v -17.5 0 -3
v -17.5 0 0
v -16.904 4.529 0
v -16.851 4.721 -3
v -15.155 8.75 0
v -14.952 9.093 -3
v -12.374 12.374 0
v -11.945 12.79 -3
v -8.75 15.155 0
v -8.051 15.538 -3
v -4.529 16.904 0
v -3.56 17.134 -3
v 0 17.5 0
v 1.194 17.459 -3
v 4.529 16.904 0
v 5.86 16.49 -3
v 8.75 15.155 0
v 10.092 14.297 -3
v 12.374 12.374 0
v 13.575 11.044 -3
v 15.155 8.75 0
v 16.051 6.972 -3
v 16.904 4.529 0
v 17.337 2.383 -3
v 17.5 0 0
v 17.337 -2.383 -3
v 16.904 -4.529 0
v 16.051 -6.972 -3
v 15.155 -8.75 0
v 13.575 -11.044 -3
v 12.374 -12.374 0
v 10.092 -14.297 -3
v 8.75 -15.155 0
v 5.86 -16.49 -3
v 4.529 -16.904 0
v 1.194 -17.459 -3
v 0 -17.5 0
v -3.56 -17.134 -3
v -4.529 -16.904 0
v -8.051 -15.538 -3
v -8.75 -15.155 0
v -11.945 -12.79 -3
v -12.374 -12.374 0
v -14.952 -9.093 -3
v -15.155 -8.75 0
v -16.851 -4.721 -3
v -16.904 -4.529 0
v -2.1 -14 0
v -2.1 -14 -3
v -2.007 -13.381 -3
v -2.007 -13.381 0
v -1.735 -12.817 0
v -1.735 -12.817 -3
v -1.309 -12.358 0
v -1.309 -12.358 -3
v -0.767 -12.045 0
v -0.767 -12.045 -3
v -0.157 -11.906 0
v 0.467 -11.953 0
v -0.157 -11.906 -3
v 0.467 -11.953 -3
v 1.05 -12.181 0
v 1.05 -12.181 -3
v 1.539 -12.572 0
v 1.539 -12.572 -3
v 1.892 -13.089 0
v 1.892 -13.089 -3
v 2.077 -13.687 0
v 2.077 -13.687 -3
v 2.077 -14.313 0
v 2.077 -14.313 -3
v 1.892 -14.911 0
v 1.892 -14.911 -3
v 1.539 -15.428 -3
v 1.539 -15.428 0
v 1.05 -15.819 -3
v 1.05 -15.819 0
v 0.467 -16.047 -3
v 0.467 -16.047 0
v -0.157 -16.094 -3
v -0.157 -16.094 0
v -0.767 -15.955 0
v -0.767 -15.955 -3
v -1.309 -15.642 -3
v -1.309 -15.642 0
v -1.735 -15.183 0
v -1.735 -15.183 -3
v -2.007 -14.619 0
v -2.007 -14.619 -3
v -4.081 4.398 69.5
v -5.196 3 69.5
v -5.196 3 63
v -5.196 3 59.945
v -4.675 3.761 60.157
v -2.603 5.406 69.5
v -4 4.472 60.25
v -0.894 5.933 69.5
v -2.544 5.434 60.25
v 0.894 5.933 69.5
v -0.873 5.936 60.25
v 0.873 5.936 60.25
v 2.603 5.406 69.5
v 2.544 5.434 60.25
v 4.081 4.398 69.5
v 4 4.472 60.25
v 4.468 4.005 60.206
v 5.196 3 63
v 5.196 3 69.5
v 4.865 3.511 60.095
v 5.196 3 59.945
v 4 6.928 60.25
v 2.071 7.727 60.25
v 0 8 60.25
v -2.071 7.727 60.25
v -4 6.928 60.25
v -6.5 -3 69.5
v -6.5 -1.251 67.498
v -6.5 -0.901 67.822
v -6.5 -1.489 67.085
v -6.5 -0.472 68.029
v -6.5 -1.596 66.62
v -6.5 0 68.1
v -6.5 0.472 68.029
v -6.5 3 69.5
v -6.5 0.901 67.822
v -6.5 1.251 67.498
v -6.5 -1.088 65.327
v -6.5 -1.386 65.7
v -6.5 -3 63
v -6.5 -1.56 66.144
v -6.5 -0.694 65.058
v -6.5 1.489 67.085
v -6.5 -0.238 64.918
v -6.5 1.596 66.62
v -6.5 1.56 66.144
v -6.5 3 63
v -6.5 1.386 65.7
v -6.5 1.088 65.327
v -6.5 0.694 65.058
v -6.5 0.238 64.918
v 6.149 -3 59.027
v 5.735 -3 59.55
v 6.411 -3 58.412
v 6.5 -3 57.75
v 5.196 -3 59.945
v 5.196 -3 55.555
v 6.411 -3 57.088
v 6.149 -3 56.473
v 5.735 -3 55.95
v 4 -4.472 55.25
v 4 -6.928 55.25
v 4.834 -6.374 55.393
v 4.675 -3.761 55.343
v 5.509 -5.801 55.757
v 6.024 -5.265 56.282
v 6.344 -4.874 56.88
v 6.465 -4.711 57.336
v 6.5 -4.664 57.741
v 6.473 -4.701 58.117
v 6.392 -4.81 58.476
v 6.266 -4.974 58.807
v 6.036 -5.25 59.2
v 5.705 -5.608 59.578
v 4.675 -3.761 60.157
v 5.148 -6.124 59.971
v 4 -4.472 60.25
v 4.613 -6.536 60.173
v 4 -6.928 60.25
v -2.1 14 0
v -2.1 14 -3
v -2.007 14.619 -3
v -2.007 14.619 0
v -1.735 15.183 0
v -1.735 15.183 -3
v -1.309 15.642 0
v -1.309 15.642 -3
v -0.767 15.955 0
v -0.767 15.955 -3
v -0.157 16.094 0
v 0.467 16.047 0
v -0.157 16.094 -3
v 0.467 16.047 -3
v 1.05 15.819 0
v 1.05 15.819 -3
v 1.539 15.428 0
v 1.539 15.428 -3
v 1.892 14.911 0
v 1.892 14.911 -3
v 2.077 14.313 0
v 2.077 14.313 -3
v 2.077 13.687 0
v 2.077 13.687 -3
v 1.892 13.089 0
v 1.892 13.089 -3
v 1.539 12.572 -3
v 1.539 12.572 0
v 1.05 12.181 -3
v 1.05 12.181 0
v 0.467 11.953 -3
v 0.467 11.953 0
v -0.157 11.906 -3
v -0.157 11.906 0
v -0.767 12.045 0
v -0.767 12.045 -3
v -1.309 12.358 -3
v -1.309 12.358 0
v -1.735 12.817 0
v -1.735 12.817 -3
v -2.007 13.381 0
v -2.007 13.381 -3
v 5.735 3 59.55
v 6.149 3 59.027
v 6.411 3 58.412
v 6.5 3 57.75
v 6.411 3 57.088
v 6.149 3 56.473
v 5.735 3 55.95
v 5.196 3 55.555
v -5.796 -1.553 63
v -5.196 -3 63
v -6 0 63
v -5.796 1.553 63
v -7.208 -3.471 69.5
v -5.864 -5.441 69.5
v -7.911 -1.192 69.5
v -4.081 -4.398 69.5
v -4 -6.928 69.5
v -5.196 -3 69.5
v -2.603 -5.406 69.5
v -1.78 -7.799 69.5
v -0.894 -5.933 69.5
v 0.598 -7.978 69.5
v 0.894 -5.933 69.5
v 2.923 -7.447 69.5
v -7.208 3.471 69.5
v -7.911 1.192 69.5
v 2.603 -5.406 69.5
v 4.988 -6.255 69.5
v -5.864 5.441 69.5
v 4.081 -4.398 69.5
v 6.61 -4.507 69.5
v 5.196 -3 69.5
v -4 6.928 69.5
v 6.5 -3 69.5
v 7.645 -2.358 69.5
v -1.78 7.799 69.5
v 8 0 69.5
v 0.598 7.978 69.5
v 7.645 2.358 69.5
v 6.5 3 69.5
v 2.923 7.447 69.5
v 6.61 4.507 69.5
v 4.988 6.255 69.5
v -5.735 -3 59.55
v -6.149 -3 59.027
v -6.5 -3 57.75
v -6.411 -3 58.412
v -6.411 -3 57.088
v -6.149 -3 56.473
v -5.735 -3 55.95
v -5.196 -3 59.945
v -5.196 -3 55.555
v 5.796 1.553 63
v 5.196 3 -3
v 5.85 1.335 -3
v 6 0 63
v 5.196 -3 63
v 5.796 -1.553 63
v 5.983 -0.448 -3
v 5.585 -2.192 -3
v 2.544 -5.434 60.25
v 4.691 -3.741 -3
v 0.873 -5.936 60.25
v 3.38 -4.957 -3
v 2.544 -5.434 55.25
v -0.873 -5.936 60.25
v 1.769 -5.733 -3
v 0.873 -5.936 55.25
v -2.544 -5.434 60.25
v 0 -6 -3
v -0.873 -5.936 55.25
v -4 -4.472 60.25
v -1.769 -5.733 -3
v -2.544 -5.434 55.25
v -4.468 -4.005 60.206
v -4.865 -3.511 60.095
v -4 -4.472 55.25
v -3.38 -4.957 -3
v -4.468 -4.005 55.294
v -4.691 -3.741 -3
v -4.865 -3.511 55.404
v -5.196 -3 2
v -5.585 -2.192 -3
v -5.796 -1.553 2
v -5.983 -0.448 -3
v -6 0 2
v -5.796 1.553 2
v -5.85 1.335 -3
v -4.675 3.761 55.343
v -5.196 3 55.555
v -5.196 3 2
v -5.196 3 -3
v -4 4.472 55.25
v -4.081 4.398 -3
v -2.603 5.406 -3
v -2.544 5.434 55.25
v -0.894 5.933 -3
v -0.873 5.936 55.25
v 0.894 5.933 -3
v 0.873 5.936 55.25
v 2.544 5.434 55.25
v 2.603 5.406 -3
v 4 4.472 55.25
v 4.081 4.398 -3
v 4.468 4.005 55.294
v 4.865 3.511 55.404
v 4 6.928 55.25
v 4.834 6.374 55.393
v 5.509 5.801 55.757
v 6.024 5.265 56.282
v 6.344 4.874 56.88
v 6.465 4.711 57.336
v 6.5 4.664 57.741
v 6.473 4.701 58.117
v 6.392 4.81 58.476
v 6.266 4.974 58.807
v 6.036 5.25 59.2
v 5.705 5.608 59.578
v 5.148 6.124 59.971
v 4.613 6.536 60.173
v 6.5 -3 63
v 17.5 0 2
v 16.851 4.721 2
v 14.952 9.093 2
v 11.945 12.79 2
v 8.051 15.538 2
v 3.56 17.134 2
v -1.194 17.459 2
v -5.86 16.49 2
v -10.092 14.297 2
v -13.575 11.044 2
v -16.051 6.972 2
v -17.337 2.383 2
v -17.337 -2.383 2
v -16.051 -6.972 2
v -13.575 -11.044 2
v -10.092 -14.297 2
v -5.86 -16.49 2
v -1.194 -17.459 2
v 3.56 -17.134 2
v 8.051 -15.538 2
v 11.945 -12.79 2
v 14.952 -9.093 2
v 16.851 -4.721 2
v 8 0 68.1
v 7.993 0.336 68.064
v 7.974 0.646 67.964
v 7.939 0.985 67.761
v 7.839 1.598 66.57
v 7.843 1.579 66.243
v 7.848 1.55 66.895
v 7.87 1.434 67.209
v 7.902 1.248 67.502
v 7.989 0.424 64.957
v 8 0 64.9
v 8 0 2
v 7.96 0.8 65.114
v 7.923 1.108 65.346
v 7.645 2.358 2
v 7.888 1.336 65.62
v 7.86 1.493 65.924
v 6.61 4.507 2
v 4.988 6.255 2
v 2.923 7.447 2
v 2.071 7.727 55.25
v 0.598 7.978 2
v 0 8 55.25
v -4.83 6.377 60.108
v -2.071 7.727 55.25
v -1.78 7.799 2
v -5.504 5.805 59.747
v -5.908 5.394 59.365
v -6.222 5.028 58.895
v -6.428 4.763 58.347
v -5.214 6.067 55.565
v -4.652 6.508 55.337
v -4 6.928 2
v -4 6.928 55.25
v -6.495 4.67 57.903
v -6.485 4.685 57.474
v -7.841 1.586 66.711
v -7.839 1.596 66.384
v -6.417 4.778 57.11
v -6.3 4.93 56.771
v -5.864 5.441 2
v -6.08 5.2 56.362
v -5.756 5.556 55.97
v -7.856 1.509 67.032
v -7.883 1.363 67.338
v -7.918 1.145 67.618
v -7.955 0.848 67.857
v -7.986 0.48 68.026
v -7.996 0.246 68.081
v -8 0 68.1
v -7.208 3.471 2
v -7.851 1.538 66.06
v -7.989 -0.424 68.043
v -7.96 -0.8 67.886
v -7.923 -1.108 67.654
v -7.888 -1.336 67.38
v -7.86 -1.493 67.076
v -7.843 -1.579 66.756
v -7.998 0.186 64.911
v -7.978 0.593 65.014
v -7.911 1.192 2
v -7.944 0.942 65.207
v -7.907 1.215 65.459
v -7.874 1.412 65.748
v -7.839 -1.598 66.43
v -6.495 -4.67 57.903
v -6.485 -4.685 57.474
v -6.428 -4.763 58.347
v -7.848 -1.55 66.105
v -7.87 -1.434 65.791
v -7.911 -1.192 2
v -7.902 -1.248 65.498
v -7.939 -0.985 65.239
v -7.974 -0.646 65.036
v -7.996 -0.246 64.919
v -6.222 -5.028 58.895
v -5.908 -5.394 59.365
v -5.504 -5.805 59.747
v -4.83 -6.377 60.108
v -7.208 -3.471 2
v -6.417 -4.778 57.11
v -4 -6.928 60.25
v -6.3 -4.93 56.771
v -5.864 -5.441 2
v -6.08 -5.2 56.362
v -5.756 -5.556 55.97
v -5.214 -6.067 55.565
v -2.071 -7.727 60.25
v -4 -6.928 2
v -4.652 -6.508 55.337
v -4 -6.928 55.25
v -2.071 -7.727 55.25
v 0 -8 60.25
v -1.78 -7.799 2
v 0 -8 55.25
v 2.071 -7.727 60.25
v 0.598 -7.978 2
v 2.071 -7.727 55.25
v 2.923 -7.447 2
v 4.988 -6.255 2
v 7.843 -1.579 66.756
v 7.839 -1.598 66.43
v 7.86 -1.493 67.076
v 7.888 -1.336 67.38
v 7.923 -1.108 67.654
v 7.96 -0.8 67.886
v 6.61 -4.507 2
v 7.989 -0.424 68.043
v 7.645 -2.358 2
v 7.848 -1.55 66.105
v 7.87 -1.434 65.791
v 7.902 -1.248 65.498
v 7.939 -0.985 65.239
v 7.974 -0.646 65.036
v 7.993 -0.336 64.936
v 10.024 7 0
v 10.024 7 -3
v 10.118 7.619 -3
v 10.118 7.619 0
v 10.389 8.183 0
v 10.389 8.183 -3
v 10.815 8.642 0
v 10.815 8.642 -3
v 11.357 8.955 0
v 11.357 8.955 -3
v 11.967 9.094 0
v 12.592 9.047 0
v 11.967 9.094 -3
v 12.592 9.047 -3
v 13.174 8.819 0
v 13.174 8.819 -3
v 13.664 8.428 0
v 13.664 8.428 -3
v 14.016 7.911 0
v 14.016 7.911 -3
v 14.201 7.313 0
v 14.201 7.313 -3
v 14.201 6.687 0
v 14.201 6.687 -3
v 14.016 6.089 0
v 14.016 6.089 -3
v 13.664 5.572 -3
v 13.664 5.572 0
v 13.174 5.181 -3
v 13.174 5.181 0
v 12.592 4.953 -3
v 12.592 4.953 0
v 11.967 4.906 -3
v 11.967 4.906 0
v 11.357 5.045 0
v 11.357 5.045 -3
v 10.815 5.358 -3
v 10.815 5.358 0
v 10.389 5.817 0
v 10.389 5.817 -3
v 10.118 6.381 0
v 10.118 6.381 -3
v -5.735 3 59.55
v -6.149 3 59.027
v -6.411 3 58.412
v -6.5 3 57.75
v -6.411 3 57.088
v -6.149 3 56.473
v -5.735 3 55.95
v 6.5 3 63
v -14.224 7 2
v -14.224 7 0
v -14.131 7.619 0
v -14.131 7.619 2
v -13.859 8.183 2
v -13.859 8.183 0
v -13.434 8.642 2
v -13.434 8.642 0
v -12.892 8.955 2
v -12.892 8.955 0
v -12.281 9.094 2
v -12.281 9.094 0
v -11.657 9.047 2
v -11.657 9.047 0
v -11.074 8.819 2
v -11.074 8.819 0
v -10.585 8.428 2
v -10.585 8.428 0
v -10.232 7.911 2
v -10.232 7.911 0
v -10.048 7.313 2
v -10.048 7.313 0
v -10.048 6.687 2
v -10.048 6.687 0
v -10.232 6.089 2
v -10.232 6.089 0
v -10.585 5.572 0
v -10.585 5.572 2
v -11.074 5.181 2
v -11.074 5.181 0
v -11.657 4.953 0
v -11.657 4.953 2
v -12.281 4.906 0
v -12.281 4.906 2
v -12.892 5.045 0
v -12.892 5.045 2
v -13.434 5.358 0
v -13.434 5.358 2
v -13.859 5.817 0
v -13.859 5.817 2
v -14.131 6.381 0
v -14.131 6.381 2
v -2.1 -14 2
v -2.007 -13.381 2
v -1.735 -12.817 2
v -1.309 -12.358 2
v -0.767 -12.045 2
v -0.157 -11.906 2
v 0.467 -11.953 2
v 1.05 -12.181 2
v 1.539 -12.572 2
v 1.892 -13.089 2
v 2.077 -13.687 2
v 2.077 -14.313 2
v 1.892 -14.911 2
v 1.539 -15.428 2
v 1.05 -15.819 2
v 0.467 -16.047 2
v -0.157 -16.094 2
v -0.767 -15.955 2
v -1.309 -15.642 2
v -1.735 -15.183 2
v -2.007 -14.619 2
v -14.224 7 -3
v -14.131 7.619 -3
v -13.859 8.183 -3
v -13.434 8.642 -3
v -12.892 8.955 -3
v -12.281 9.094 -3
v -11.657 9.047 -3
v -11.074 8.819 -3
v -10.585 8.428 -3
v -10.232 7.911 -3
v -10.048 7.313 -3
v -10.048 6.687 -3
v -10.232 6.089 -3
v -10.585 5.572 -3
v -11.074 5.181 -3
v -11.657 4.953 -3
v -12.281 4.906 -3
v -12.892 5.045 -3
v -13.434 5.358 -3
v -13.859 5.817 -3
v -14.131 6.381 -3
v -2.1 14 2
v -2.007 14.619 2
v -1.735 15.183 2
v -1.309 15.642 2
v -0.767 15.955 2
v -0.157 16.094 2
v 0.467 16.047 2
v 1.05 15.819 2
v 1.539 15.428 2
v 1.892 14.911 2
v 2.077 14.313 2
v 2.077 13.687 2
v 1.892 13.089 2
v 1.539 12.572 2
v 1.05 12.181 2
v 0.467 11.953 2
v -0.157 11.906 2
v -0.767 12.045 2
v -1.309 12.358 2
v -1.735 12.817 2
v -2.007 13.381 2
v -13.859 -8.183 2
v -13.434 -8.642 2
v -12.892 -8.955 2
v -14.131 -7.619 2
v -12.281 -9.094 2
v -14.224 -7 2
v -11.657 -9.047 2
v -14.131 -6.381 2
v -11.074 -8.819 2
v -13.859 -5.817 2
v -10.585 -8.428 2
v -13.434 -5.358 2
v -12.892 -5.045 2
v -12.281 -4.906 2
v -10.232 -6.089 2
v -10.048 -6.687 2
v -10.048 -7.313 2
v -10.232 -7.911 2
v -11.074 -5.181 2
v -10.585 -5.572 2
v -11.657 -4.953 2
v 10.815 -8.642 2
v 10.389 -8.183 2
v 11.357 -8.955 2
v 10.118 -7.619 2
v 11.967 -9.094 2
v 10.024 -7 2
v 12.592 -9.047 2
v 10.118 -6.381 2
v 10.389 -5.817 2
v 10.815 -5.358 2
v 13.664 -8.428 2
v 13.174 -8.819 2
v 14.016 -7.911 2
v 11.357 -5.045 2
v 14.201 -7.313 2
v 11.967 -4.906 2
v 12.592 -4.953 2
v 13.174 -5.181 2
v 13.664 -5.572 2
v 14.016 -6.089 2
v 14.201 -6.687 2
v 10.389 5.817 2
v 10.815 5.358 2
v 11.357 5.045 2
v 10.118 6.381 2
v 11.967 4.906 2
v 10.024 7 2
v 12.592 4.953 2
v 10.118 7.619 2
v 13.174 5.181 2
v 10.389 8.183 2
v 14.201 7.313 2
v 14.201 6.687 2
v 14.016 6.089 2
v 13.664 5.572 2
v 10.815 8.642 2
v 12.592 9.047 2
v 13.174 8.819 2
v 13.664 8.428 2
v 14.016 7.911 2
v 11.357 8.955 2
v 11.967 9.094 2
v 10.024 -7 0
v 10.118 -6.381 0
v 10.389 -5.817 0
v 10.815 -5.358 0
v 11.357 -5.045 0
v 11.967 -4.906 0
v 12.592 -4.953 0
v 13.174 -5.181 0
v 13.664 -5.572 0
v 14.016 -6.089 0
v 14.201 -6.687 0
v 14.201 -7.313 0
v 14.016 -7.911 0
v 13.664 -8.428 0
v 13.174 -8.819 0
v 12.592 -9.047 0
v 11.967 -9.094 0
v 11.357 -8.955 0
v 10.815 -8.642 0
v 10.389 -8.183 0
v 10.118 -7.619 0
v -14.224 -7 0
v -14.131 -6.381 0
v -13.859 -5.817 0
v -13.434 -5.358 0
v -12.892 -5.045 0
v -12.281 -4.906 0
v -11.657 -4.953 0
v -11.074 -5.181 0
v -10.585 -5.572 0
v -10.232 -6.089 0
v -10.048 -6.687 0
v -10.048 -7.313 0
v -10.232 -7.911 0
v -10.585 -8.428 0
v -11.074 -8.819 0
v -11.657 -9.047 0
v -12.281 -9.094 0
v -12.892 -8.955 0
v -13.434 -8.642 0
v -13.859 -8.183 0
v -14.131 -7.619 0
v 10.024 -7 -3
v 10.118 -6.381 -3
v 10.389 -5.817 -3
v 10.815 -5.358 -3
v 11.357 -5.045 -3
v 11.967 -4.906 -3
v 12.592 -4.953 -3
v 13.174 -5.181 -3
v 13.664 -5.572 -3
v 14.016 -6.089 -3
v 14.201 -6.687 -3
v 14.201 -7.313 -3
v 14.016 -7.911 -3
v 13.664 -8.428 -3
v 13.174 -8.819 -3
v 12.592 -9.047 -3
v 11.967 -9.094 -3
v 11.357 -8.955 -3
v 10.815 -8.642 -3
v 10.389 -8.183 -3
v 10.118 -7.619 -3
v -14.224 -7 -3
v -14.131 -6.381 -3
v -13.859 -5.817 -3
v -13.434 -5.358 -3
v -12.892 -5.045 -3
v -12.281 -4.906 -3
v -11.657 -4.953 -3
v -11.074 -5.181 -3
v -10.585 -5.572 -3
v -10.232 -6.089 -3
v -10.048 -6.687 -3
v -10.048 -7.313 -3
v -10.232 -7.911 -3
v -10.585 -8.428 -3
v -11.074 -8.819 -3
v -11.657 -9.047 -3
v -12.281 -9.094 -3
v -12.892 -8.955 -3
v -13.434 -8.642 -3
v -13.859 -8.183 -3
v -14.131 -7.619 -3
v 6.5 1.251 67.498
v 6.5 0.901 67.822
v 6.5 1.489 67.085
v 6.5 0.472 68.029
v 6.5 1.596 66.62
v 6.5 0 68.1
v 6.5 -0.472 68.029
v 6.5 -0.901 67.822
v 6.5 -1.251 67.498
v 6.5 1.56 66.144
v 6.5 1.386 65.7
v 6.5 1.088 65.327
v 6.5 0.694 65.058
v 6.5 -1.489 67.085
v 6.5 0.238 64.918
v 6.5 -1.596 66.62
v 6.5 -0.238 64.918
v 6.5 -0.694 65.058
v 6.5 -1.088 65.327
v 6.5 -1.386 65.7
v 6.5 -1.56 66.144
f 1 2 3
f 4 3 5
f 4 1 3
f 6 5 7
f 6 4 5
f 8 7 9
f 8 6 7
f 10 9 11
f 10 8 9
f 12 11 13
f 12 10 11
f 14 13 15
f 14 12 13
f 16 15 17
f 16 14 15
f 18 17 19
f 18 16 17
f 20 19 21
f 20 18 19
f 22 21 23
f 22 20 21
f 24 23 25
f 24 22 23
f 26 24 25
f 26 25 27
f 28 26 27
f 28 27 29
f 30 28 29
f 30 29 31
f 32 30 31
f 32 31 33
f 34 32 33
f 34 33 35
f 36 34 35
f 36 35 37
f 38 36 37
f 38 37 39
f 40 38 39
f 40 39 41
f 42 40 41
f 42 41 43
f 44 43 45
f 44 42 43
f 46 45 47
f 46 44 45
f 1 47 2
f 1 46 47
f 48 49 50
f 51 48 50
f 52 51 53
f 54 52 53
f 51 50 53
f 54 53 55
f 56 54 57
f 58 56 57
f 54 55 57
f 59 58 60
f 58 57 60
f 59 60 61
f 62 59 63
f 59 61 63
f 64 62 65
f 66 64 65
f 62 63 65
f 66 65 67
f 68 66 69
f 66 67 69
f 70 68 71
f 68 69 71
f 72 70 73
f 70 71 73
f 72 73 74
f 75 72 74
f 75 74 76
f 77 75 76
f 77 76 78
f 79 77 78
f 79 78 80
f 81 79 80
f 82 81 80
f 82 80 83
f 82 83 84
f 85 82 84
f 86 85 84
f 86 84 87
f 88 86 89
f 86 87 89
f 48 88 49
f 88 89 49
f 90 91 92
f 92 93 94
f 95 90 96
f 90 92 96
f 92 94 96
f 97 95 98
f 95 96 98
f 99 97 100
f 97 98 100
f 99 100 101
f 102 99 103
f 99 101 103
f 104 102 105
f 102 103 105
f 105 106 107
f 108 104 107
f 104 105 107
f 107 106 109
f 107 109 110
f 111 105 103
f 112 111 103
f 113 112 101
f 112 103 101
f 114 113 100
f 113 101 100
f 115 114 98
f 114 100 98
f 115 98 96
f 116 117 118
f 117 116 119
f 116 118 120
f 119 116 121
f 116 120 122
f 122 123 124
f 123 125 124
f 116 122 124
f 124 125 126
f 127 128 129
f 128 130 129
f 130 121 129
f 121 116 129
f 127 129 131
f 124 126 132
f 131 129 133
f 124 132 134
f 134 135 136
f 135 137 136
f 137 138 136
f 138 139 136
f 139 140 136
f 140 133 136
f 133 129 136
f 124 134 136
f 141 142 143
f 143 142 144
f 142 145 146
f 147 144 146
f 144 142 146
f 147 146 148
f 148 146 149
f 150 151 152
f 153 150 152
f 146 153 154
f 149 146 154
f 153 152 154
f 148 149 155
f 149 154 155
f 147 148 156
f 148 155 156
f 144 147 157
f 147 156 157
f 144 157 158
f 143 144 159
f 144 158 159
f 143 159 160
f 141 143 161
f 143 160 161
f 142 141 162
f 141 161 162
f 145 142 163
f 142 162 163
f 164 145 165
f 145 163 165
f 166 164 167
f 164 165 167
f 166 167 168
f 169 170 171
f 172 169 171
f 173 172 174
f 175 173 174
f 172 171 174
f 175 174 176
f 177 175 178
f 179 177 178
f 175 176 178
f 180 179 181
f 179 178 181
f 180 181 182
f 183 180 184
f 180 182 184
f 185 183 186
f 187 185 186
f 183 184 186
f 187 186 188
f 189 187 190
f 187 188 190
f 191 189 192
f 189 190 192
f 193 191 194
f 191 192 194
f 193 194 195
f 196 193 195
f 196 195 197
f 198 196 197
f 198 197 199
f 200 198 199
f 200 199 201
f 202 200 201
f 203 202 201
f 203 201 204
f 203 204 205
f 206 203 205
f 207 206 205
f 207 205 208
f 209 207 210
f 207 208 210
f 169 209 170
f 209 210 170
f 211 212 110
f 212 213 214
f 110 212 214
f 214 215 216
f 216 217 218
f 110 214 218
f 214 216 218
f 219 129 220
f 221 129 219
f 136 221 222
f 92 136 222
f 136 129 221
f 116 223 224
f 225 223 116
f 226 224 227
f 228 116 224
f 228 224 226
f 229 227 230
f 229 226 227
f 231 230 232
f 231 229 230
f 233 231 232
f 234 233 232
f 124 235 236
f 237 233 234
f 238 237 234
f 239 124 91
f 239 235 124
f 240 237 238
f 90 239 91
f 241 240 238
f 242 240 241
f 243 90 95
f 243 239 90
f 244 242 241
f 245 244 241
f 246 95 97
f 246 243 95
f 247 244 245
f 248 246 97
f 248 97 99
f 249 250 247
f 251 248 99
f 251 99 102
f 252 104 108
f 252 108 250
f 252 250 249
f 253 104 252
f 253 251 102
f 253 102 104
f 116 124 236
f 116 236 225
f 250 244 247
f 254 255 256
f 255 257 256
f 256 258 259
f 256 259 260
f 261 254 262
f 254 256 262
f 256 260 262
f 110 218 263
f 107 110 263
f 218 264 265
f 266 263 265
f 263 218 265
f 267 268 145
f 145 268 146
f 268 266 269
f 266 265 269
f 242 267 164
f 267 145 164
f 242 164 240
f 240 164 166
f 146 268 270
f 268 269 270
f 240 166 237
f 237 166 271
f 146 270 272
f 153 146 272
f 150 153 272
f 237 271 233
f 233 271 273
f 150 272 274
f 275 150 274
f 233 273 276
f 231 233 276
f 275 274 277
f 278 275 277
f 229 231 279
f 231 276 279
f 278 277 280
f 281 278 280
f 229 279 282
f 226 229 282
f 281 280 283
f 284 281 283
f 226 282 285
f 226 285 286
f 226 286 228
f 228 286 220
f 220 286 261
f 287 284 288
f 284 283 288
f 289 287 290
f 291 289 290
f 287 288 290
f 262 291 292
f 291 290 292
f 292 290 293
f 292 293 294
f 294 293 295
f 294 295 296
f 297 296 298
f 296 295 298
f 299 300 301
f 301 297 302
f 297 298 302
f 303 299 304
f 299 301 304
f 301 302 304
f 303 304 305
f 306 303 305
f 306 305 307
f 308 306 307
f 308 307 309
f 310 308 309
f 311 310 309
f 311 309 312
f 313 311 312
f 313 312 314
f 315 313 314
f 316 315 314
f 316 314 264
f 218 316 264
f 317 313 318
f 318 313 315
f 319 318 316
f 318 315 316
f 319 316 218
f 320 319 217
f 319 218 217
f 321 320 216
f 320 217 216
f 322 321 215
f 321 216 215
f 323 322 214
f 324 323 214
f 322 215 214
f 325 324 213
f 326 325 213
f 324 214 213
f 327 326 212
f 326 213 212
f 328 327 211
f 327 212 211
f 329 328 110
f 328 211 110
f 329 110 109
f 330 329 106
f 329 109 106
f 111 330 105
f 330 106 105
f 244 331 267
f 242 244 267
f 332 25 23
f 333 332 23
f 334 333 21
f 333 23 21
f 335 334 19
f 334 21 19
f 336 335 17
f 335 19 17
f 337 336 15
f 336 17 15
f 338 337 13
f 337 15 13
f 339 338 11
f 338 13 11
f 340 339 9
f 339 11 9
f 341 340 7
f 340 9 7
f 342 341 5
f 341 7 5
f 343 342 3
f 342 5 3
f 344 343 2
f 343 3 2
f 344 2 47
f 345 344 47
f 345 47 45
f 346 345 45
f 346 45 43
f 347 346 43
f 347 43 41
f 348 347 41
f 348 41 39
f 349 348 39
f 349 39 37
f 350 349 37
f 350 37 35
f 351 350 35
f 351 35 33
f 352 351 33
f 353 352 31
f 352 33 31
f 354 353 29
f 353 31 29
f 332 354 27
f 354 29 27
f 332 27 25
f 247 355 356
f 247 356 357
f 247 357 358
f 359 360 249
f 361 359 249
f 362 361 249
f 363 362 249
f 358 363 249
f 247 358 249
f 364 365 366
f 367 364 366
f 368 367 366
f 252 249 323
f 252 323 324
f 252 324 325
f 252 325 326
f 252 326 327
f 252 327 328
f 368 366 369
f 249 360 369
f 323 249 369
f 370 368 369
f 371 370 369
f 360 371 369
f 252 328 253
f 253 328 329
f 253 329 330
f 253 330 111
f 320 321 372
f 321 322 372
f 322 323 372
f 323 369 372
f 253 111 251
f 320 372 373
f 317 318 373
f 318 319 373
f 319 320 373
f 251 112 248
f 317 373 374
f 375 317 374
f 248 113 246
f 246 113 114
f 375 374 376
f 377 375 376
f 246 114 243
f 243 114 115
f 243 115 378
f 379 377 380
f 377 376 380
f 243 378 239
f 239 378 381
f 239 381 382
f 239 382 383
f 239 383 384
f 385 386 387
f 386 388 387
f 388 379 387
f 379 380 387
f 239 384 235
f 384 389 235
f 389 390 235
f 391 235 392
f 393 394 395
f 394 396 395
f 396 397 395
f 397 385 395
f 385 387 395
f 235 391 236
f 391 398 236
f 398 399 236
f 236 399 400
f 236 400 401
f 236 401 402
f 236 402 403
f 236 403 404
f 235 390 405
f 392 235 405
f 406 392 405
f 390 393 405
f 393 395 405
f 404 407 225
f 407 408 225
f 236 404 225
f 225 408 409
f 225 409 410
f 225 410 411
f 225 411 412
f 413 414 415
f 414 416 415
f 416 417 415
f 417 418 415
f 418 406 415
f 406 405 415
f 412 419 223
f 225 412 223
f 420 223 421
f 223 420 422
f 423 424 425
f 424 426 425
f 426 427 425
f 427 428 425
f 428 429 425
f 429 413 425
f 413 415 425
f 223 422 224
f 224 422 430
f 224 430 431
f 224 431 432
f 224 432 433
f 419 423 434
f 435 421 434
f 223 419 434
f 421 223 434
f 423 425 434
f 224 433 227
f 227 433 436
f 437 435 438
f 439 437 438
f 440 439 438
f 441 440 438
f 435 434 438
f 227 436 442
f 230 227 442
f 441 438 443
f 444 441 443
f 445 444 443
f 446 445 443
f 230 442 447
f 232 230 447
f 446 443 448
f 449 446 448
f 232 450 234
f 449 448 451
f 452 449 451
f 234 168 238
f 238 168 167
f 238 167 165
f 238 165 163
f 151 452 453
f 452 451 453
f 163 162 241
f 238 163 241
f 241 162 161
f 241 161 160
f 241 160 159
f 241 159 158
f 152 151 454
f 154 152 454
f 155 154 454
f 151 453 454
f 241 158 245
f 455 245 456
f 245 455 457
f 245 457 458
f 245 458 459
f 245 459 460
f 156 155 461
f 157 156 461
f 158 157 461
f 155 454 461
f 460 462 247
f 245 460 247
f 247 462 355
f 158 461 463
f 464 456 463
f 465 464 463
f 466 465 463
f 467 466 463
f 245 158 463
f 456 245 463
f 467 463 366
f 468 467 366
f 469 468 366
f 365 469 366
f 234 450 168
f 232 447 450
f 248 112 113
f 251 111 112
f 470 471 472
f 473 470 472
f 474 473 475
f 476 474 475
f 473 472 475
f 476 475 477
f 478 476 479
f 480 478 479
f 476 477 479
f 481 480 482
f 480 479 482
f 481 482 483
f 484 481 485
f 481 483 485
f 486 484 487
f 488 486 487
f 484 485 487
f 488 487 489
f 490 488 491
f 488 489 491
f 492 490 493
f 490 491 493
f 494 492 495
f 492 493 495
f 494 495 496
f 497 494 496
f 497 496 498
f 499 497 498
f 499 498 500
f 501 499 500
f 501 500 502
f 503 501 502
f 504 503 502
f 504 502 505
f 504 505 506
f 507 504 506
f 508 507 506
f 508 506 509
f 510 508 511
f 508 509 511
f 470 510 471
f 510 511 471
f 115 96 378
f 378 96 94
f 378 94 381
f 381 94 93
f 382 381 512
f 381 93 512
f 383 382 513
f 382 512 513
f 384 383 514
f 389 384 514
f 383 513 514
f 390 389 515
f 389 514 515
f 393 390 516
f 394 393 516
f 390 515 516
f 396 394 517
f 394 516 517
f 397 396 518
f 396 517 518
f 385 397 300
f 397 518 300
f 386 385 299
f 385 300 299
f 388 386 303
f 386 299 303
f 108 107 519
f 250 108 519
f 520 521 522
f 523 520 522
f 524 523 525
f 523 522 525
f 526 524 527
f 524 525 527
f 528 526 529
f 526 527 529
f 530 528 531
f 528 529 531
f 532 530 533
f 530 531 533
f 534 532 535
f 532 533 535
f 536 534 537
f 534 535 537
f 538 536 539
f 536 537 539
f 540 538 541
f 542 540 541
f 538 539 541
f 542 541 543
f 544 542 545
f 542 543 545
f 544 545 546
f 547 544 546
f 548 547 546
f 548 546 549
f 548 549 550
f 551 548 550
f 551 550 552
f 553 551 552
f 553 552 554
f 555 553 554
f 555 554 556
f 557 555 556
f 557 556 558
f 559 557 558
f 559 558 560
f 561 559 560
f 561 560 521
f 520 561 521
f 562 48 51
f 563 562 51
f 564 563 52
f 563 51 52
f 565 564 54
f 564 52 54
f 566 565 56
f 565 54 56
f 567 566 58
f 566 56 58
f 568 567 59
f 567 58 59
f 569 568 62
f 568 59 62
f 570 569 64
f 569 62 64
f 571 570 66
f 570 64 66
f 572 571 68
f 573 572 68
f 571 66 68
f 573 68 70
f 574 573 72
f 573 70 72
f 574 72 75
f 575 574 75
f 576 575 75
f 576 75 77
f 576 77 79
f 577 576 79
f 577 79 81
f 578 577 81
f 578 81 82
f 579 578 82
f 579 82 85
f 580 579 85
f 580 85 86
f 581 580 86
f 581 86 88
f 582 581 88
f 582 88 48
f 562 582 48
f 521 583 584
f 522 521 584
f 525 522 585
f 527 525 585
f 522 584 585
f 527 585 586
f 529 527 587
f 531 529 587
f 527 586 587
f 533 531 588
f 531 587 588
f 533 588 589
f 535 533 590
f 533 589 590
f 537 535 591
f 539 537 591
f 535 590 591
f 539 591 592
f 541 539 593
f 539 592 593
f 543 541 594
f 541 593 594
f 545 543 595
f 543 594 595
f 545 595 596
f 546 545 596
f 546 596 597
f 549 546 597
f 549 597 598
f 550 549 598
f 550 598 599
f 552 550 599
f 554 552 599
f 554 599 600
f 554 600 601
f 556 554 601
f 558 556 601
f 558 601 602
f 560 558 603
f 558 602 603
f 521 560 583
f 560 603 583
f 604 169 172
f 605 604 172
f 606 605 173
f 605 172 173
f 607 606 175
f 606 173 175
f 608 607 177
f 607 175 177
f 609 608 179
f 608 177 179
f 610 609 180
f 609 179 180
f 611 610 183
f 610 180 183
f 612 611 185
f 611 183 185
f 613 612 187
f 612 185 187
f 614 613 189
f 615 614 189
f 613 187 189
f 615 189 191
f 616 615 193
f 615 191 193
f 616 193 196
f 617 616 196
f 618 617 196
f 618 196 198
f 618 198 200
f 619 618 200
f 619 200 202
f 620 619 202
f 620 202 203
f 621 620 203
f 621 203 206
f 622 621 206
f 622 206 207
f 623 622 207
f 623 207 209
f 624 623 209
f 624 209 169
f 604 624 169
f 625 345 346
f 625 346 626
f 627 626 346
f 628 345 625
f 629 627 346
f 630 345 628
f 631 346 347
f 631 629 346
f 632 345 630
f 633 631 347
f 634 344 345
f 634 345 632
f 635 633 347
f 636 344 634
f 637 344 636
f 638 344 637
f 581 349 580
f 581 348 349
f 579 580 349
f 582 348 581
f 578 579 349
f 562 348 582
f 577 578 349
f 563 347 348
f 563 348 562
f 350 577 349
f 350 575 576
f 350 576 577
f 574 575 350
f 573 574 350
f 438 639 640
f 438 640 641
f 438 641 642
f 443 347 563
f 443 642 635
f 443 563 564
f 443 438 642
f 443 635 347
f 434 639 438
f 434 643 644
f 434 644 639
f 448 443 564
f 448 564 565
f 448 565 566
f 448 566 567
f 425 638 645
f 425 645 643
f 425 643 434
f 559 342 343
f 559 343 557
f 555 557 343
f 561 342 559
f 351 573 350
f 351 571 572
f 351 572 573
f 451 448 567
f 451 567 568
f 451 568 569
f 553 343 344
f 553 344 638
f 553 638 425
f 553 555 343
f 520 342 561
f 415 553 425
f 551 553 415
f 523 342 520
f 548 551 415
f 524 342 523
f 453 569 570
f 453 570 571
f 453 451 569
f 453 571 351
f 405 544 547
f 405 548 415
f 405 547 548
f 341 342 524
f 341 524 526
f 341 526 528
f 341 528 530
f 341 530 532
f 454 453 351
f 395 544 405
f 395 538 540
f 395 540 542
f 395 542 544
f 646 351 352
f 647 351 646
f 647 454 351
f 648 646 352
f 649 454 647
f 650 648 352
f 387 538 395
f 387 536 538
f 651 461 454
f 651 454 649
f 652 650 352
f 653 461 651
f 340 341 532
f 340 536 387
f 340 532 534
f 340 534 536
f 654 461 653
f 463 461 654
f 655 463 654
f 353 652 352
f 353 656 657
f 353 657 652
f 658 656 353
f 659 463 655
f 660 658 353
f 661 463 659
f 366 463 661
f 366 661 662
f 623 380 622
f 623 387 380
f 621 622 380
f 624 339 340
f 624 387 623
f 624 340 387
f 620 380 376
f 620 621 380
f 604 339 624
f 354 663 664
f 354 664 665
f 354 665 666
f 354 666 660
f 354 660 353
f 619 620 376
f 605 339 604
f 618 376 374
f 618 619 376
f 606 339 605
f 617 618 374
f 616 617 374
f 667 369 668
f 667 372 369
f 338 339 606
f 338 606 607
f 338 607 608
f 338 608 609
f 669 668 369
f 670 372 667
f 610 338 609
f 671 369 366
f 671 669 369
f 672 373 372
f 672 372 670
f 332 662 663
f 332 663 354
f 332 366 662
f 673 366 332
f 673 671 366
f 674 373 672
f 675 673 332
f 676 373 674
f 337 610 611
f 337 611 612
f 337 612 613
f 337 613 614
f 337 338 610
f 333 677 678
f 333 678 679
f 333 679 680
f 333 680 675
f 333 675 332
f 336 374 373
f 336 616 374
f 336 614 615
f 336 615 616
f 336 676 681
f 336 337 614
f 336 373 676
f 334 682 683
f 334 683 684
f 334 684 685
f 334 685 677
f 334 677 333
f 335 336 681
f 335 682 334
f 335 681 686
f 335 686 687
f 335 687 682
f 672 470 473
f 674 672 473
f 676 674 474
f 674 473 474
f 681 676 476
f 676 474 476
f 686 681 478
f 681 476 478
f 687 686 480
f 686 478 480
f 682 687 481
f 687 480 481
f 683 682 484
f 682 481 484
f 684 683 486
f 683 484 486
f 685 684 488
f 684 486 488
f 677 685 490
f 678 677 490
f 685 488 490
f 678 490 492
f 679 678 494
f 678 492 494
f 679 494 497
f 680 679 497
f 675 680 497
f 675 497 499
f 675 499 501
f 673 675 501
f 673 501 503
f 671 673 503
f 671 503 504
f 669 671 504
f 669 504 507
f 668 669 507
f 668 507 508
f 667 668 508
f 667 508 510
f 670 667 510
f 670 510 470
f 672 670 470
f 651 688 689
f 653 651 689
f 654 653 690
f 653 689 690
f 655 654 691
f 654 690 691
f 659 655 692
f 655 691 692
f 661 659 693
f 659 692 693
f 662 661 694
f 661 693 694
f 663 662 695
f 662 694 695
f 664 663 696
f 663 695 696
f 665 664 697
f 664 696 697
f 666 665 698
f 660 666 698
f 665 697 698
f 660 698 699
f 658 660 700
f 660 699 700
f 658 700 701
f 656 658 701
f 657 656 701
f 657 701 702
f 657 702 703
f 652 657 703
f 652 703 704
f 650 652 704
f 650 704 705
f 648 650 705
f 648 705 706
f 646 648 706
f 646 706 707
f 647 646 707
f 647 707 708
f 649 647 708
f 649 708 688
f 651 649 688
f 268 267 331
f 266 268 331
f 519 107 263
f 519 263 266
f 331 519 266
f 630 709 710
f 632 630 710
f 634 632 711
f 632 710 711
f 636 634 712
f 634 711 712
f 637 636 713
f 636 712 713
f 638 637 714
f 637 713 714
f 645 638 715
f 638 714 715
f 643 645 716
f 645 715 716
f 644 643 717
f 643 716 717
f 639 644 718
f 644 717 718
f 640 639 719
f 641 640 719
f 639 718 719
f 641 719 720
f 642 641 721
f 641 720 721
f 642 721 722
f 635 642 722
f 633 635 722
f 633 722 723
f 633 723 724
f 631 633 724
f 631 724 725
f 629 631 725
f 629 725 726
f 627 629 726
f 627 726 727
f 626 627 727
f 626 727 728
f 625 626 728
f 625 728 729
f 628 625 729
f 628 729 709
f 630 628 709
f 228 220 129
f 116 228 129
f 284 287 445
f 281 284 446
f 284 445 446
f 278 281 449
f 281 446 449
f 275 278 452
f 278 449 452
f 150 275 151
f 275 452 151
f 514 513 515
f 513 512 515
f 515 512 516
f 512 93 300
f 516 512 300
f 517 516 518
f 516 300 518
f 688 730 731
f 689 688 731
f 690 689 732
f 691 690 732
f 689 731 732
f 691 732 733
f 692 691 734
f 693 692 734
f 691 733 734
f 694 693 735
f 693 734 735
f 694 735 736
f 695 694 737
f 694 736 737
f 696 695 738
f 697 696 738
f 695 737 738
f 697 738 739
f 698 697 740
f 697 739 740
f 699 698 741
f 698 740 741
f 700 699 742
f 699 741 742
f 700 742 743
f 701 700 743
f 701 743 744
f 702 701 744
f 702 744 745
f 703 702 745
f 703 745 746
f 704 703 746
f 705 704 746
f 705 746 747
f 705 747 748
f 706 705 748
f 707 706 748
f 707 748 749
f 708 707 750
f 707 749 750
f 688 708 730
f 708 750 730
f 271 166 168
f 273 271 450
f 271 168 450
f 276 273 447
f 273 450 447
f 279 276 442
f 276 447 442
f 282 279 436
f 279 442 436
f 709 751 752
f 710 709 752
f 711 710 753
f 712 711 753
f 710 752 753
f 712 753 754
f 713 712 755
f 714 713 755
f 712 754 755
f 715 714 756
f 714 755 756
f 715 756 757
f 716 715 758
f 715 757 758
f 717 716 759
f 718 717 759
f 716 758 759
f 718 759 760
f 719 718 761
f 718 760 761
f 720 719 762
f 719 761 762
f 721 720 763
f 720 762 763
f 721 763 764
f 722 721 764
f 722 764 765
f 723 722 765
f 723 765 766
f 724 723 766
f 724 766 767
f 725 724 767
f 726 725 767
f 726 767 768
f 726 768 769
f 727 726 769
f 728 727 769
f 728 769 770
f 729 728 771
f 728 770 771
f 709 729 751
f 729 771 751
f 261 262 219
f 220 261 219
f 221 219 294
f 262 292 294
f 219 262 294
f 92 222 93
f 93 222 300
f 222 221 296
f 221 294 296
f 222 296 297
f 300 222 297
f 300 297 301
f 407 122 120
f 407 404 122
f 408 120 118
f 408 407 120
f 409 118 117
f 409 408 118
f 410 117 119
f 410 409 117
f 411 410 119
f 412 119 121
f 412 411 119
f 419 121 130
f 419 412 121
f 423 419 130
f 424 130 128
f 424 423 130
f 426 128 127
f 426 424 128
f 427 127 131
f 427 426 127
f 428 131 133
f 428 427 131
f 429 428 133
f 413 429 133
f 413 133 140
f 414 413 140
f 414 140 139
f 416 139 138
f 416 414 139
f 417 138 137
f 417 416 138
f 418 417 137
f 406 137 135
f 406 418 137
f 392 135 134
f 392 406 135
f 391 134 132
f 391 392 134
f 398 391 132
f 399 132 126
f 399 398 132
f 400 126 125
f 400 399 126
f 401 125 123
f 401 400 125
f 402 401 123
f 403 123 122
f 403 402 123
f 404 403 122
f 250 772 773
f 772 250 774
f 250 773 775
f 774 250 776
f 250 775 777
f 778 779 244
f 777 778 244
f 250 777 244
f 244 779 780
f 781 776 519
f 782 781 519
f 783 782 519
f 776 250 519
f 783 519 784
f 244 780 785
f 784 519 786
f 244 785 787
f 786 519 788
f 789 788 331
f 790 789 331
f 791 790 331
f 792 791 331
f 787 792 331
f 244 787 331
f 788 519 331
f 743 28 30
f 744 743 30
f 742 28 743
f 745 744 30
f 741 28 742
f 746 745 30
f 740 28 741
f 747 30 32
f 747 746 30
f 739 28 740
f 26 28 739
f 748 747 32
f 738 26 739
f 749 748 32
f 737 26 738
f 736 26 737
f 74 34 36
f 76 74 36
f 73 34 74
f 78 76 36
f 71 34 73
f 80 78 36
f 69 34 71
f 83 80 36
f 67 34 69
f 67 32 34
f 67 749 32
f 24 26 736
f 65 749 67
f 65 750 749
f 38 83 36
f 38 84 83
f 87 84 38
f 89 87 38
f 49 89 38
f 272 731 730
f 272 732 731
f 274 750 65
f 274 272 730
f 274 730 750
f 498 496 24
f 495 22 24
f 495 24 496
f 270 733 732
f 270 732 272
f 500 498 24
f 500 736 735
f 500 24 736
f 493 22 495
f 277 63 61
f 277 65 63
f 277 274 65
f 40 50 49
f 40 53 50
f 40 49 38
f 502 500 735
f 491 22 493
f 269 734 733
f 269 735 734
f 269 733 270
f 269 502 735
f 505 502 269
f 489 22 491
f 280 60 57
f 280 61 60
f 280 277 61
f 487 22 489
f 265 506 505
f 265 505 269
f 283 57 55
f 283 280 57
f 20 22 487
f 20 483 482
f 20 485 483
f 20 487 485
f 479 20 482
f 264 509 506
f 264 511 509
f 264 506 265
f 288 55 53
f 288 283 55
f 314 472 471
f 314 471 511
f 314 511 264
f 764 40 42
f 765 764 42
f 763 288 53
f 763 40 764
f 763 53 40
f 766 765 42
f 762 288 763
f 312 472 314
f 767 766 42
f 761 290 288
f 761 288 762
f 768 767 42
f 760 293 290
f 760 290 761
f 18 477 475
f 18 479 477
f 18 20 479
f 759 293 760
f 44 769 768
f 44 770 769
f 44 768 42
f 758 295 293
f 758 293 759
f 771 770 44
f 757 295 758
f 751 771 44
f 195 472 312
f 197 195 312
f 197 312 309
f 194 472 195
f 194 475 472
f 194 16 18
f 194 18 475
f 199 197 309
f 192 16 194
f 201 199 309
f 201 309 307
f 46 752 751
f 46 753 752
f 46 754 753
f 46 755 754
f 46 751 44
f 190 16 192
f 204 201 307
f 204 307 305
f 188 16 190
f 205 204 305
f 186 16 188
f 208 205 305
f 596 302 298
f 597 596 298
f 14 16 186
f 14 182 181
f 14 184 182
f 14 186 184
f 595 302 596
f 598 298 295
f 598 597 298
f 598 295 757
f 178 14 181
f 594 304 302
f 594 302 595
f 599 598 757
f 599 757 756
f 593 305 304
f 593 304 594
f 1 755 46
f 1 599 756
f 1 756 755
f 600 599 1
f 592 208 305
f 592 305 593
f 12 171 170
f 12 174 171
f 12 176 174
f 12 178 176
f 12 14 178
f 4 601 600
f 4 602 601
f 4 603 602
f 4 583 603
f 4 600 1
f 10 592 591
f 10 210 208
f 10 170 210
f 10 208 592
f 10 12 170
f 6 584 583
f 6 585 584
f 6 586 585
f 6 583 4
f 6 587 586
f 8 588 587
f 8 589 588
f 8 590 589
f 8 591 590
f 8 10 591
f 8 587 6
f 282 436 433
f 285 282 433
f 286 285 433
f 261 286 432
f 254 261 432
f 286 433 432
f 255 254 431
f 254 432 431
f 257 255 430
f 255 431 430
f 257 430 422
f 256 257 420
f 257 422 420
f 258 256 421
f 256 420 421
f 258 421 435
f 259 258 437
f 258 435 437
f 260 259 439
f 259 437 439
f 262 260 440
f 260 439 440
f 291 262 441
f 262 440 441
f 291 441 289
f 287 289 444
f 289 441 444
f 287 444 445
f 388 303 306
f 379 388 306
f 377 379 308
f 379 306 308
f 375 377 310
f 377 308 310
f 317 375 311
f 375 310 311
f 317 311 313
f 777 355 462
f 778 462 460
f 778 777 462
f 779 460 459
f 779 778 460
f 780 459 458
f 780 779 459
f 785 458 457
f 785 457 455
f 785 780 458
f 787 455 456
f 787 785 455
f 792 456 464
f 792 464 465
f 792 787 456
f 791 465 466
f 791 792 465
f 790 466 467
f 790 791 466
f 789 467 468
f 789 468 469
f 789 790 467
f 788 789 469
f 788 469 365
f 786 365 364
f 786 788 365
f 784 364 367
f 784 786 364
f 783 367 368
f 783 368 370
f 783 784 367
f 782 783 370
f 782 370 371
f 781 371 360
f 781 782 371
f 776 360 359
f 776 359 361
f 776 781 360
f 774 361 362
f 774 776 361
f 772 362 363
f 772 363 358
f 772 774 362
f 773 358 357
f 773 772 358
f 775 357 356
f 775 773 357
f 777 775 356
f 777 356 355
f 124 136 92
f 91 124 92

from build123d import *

# Parameters (mm, degrees)
SKETCH_1_R                = 17.499999999999996
SKETCH_1_R_2              = 2
SKETCH_1_R_3              = 2.000000000000001
SKETCH_1_R_4              = 1.9999999999999996
EXTRUDE_1_DEPTH           = 2
SKETCH_2_R                = 8
EXTRUDE_2_DEPTH           = 61.5
SKETCH_6_R                = 8
EXTRUDE_3_DEPTH           = 2
SKETCH_7_R                = 5
CUT_EXTRUDE_2_DEPTH       = 63.5
SKETCH_21_R               = 7
CUT_EXTRUDE_4_DEPTH       = 63.5
CUT_EXTRUDE_5_DEPTH       = 2
CUT_EXTRUDE_START         = -18
SKETCH_30_R               = 8
CUT_EXTRUDE_7_DEPTH       = 18
SKETCH_35_R               = 2.1
SKETCH_35_R_2             = 2.100000000000001
SKETCH_35_R_3             = 2.1000000000000005
SKETCH_35_R_4             = 2.099999999999999
CUT_EXTRUDE_9_DEPTH       = 10
EXTRUDE_START             = 3
SKETCH_37_R               = 17.5
SKETCH_37_R_2             = 2.1000000000000005
SKETCH_37_R_3             = 2.0999999999999996
SKETCH_37_R_4             = 2.099999999999999
EXTRUDE_5_DEPTH           = 3
EXTRUDE_7_DEPTH           = 10
EXTRUDE_7_DEPTH_BACK      = 46.00000000000002
SKETCH_44_R               = 8
SKETCH_44_R_2             = 6
CUT_EXTRUDE_21_DEPTH      = 55.5
SKETCH_47_R               = 7.999999999999998
EXTRUDE_8_DEPTH           = 5
SKETCH_48_R               = 7.999999999999998
EXTRUDE_9_DEPTH           = 7
CUT_EXTRUDE_22_DEPTH      = 21.000000000000004
CUT_EXTRUDE_22_DEPTH_BACK = 11.000000000000004
SKETCH_49_R               = 1.6000000000000052
SKETCH_52_R               = 6.798902153846566
CUT_EXTRUDE_25_DEPTH      = 10
EXTRUDE_START_2           = 5
SKETCH_53_R               = 6.798902153846566
SKETCH_53_R_2             = 6.000000000000001
EXTRUDE_11_DEPTH          = 5
CUT_EXTRUDE_26_DEPTH      = 21
CUT_EXTRUDE_26_DEPTH_BACK = 29
EXTRUDE_13_DEPTH          = 61.00000000000004


with BuildPart() as part:
    # 草图1 → 凸台-拉伸1 (new body)
    with BuildSketch(Plane.XY):
        Circle(SKETCH_1_R)
        with Locations((0, 14)):
            Circle(SKETCH_1_R_2, mode=Mode.SUBTRACT)
        with Locations((12.124355652982159, 6.999999999999974)):
            Circle(SKETCH_1_R_3, mode=Mode.SUBTRACT)
        with Locations((12.12435565298211, -7.000000000000057)):
            Circle(SKETCH_1_R_4, mode=Mode.SUBTRACT)
        with Locations((-9.776e-14, -14)):
            Circle(SKETCH_1_R_2, mode=Mode.SUBTRACT)
        with Locations((-12.12435565298221, -6.999999999999886)):
            Circle(SKETCH_1_R_4, mode=Mode.SUBTRACT)
        with Locations((-12.12435565298206, 7.000000000000141)):
            Circle(SKETCH_1_R_3, mode=Mode.SUBTRACT)
    extrude(amount=EXTRUDE_1_DEPTH)

    # 草图2 → 凸台-拉伸2 (add)
    with BuildSketch(Plane.XY.offset(2)):
        Circle(SKETCH_2_R)
    extrude(amount=EXTRUDE_2_DEPTH)

    # 草图6 → 凸台-拉伸3 (add)
    with BuildSketch(Plane.XY.offset(63.5)):
        Circle(SKETCH_6_R)
    extrude(amount=EXTRUDE_3_DEPTH)

    # 草图7 → 切除-拉伸2 (cut)
    with BuildSketch(Plane.XY.offset(65.5)):
        Circle(SKETCH_7_R)
    extrude(amount=-CUT_EXTRUDE_2_DEPTH, mode=Mode.SUBTRACT)

    # 草图21 → 切除-拉伸4 (cut)
    with BuildSketch(Plane.XY.offset(65.5)):
        Circle(SKETCH_21_R)
    extrude(amount=-CUT_EXTRUDE_4_DEPTH, mode=Mode.SUBTRACT)

    # 草图22 → 切除-拉伸5 (cut)
    with BuildSketch(Plane(origin=(0, 0, 0), x_dir=(-1, 0, 0), z_dir=(0, 0, -1))):
        with BuildLine():
            ThreePointArc((2.99966326467678, -5.999663264676775), (5.484805158577535, 3.7e-16), (2.9996632646767774, 5.999663264676775))
            ThreePointArc((2.9996632646767774, 5.999663264676775), (1.0003367353232246, 5.9996632646767765), (1.0003367353232226, 4.0003367353232235))
            ThreePointArc((1.0003367353232226, 4.0003367353232235), (2.6573304651534118, -2.6e-16), (1.000336735323225, -4.000336735323225))
            ThreePointArc((1.000336735323225, -4.000336735323225), (1.0003367353232278, -5.999663264676777), (2.99966326467678, -5.999663264676775))
        make_face()
        with BuildLine():
            ThreePointArc((-2.999663264675801, 5.999663264676881), (-5.48480515857711, 2.7491e-13), (-2.9996632646768204, -5.999663264676754))
            ThreePointArc((-2.9996632646768204, -5.999663264676754), (-1.0003367353232673, -5.99966326467677), (-1.0003367353232513, -4.000336735323216))
            ThreePointArc((-1.0003367353232513, -4.000336735323216), (-2.657330465152986, 1.3523e-13), (-1.00033673532243, 4.000336735323146))
            ThreePointArc((-1.00033673532243, 4.000336735323146), (-1.0003367353222479, 5.999663264676704), (-2.999663264675801, 5.999663264676881))
        make_face()
    extrude(amount=-CUT_EXTRUDE_5_DEPTH, mode=Mode.SUBTRACT)

    # 草图30 → 切除-拉伸7 (cut)
    with BuildSketch(Plane.XY.offset(65.5).offset(CUT_EXTRUDE_START)):
        Circle(SKETCH_30_R)
    extrude(amount=CUT_EXTRUDE_7_DEPTH, mode=Mode.SUBTRACT)

    # 草图35 → 切除-拉伸9 (cut)
    with BuildSketch(Plane(origin=(0, 0, 0), x_dir=(-1, 0, 0), z_dir=(0, 0, -1))):
        with Locations((0, 14)):
            Circle(SKETCH_35_R)
        with Locations((12.124355652982159, 6.999999999999974)):
            Circle(SKETCH_35_R_2)
        with Locations((12.12435565298211, -7.000000000000057)):
            Circle(SKETCH_35_R_2)
        with Locations((-9.776e-14, -14)):
            Circle(SKETCH_35_R)
        with Locations((-12.12435565298221, -6.999999999999886)):
            Circle(SKETCH_35_R_3)
        with Locations((-12.12435565298206, 7.000000000000141)):
            Circle(SKETCH_35_R_4)
    extrude(amount=-CUT_EXTRUDE_9_DEPTH, mode=Mode.SUBTRACT)

    # 草图37 → 凸台-拉伸5 (add)
    with BuildSketch(Plane(origin=(0, 0, 0), x_dir=(-1, 0, 0), z_dir=(0, 0, -1)).offset(EXTRUDE_START)):
        Circle(SKETCH_37_R)
        with Locations((12.124355652982159, 6.999999999999974)):
            Circle(SKETCH_37_R_2, mode=Mode.SUBTRACT)
        with Locations((12.12435565298211, -7.000000000000057)):
            Circle(SKETCH_37_R_2, mode=Mode.SUBTRACT)
        with Locations((-9.776e-14, -14)):
            Circle(SKETCH_37_R_3, mode=Mode.SUBTRACT)
        with Locations((-12.12435565298221, -6.999999999999886)):
            Circle(SKETCH_37_R_2, mode=Mode.SUBTRACT)
        with Locations((-12.12435565298206, 7.000000000000141)):
            Circle(SKETCH_37_R_4, mode=Mode.SUBTRACT)
        with Locations((0, 14)):
            Circle(SKETCH_37_R_3, mode=Mode.SUBTRACT)
        with BuildLine():
            ThreePointArc((-2.999663264676821, -5.999663264676754), (-1.000336735323267, -5.99966326467677), (-1.0003367353232513, -4.000336735323216))
            ThreePointArc((-1.0003367353232513, -4.000336735323216), (-2.6573304651529885, 1.3523e-13), (-1.0003367353224324, 4.000336735323147))
            ThreePointArc((-1.0003367353224324, 4.000336735323147), (-1.0003367353222492, 5.999663264676702), (-2.9996632646758017, 5.999663264676881))
            ThreePointArc((-2.9996632646758017, 5.999663264676881), (-5.484805158577112, 2.7491e-13), (-2.999663264676821, -5.999663264676754))
        make_face(mode=Mode.SUBTRACT)
        with BuildLine():
            ThreePointArc((1.000336735323223, -4.000336735323228), (1.0003367353232275, -5.9996632646767765), (2.9996632646767774, -5.999663264676779))
            ThreePointArc((2.9996632646767774, -5.999663264676779), (5.484805158577537, -2.46e-15), (2.999663264676779, 5.999663264676775))
            ThreePointArc((2.999663264676779, 5.999663264676775), (1.000336735323224, 5.999663264676778), (1.0003367353232224, 4.0003367353232235))
            ThreePointArc((1.0003367353232224, 4.0003367353232235), (2.6573304651534126, -1.52e-15), (1.000336735323223, -4.000336735323228))
        make_face(mode=Mode.SUBTRACT)
    extrude(amount=-EXTRUDE_5_DEPTH)

    # 草图44 → 凸台-拉伸7 (add, two sides: drawn at the far end of the back side and taken through both)
    with BuildSketch(Plane.XY.offset(47.5).offset(-EXTRUDE_7_DEPTH_BACK)):
        Circle(SKETCH_44_R)
        Circle(SKETCH_44_R_2, mode=Mode.SUBTRACT)
    extrude(amount=EXTRUDE_7_DEPTH + EXTRUDE_7_DEPTH_BACK)

    # 草图46 → 切除-拉伸21 (cut)
    with BuildSketch(Plane.XY.offset(57.5)):
        with BuildLine():
            Line((-6.5, -3), (-5.196152422706578, -3))
            ThreePointArc((-5.196152422706599, -3.000000000000059), (-6.000000000000001, 7.3e-16), (-5.1961524227066, 3.0000000000000577))
            Line((-5.196152422706579, 2.999999999999998), (-6.500000000000001, 2.9999999999999973))
            Line((-6.500000000000001, 2.9999999999999973), (-6.5, -3))
        make_face()
        with BuildLine():
            Line((-5.196152422706578, -3), (0, -3))
            Line((0, -3), (-1.1e-15, 3))
            Line((-1.1e-15, 3), (-5.196152422706579, 2.999999999999998))
            ThreePointArc((-5.1961524227066, 3.0000000000000577), (-6.000000000000001, 7.3e-16), (-5.196152422706599, -3.000000000000059))
        make_face()
        with BuildLine():
            Line((-1.1e-15, 3), (0, -3))
            Line((0, -3), (5.196152422706767, -3))
            ThreePointArc((5.196152422706716, -2.9999999999998557), (5.795554957734432, -1.552914270615042), (6.000000000000001, -1.47e-15))
            ThreePointArc((6.000000000000001, 0), (5.795554957734432, 1.5529142706150447), (5.1961524227067155, 2.999999999999857))
            Line((5.196152422706765, 3), (-1.1e-15, 3))
        make_face()
        with BuildLine():
            ThreePointArc((6.000000000000001, -1.47e-15), (5.795554957734432, -1.552914270615042), (5.196152422706716, -2.9999999999998557))
            Line((5.196152422706767, -3), (6.5, -3))
            Line((6.5, -3), (6.5, 3))
            Line((6.5, 3), (5.196152422706765, 3))
            ThreePointArc((5.1961524227067155, 2.999999999999857), (5.795554957734432, 1.5529142706150447), (6.000000000000001, 0))
        make_face()
    extrude(amount=-CUT_EXTRUDE_21_DEPTH, mode=Mode.SUBTRACT)

    # 草图47 → 凸台-拉伸8 (add)
    with BuildSketch(Plane.XY.offset(57.5)):
        Circle(SKETCH_47_R)
        with BuildLine():
            Line((5.196152422706634, -3), (6.5, -3))
            Line((6.5, -3), (6.5, 3))
            Line((6.5, 3), (5.196152422706633, 3.000000000000002))
            ThreePointArc((5.196152422706633, 3.000000000000002), (-2.3e-15, 6.000000000000002), (-5.196152422706635, 2.999999999999998))
            Line((-5.196152422706635, 2.999999999999998), (-6.500000000000001, 2.9999999999999973))
            Line((-6.500000000000001, 2.9999999999999973), (-6.5, -3))
            Line((-6.5, -3), (-5.196152422706634, -3))
            ThreePointArc((-5.196152422706634, -3), (3.7e-16, -6.000000000000002), (5.196152422706634, -3))
        make_face(mode=Mode.SUBTRACT)
    extrude(amount=EXTRUDE_8_DEPTH)

    # 草图48 → 凸台-拉伸9 (add)
    with BuildSketch(Plane.XY.offset(62.5)):
        Circle(SKETCH_48_R)
        with BuildLine():
            Line((-5.196152422706634, -2.9999999999999987), (-6.5, -3))
            Line((-6.5, -3), (-6.500000000000001, 2.9999999999999973))
            Line((-6.500000000000001, 2.9999999999999973), (-5.196152422706635, 2.999999999999998))
            ThreePointArc((-5.196152422706635, 2.999999999999998), (-2.3e-15, 6.000000000000002), (5.196152422706633, 3.000000000000002))
            Line((5.196152422706633, 3.000000000000002), (6.5, 3))
            Line((6.5, 3), (6.5, -3))
            Line((6.5, -3), (5.196152422706634, -3))
            ThreePointArc((5.196152422706634, -3), (-9.6e-16, -6.000000000000001), (-5.196152422706634, -2.9999999999999987))
        make_face(mode=Mode.SUBTRACT)
    extrude(amount=EXTRUDE_9_DEPTH)

    # 草图49 → 切除-拉伸22 (cut, two sides: drawn at the far end of the back side and taken through both)
    with BuildSketch(Plane(origin=(0, 0, 0), x_dir=(0, 0, -1), z_dir=(1, 0, 0)).offset(-CUT_EXTRUDE_22_DEPTH_BACK)):
        with Locations(Location((-66.5, 0, 0), (0, 0, 180))):
            Circle(SKETCH_49_R)
    extrude(amount=CUT_EXTRUDE_22_DEPTH + CUT_EXTRUDE_22_DEPTH_BACK, mode=Mode.SUBTRACT)

    # 草图52 → 切除-拉伸25 (cut)
    with BuildSketch(Plane.XY.offset(2)):
        with Locations(Location((0, 0, 0), (0, 0, 17.052451517))):
            Circle(SKETCH_52_R)
    extrude(amount=-CUT_EXTRUDE_25_DEPTH, mode=Mode.SUBTRACT)

    # 草图53 → 凸台-拉伸11 (add)
    with BuildSketch(Plane(origin=(0, 0, 2), x_dir=(-1, 0, 0), z_dir=(0, 0, -1)).offset(EXTRUDE_START_2)):
        Circle(SKETCH_53_R)
        with Locations(Location((0, 0, 0), (0, 0, 150))):
            Circle(SKETCH_53_R_2, mode=Mode.SUBTRACT)
    extrude(amount=-EXTRUDE_11_DEPTH)

    # 草图56 → 切除-拉伸26 (cut, two sides: drawn at the far end of the back side and taken through both)
    with BuildSketch(Plane(origin=(0, 0, 0), x_dir=(1, 0, 0), z_dir=(0, 1, 0)).offset(-CUT_EXTRUDE_26_DEPTH_BACK)):
        with BuildLine():
            Line((4.000000000000007, -60.249924116242), (-3.9999999999999933, -60.249924116242))
            ThreePointArc((-3.9999999999999933, -60.249924116242), (-6.5, -57.749924116242), (-3.9999999999999942, -55.24992411624199))
            Line((-3.9999999999999942, -55.24992411624199), (4.000000000000008, -55.24992411624199))
            ThreePointArc((4.000000000000008, -55.24992411624199), (6.500000000000007, -57.749924116242), (4.000000000000007, -60.249924116242))
        make_face()
    extrude(amount=CUT_EXTRUDE_26_DEPTH + CUT_EXTRUDE_26_DEPTH_BACK, mode=Mode.SUBTRACT)

    # 草图57 → 凸台-拉伸13 (add)
    with BuildSketch(Plane.XY.offset(2)):
        with BuildLine():
            ThreePointArc((-5.196152422706635, -2.999999999999999), (-6.000000000000002, 7.3e-16), (-5.196152422706635, 2.9999999999999982))
            Line((-5.196152422706635, 2.999999999999998), (-6.500000000000001, 2.9999999999999973))
            Line((-6.500000000000001, 2.9999999999999973), (-6.5, -3))
            Line((-6.5, -3), (-5.196152422706634, -2.9999999999999987))
        make_face()
        with BuildLine():
            Line((6.5, 3), (5.196152422706633, 3.000000000000002))
            ThreePointArc((5.196152422706633, 3.000000000000002), (6.000000000000002, 1.33e-15), (5.196152422706634, -3.000000000000001))
            Line((5.196152422706634, -3), (6.5, -3))
            Line((6.5, -3), (6.5, 3))
        make_face()
    extrude(amount=EXTRUDE_13_DEPTH)


solid = part.part
